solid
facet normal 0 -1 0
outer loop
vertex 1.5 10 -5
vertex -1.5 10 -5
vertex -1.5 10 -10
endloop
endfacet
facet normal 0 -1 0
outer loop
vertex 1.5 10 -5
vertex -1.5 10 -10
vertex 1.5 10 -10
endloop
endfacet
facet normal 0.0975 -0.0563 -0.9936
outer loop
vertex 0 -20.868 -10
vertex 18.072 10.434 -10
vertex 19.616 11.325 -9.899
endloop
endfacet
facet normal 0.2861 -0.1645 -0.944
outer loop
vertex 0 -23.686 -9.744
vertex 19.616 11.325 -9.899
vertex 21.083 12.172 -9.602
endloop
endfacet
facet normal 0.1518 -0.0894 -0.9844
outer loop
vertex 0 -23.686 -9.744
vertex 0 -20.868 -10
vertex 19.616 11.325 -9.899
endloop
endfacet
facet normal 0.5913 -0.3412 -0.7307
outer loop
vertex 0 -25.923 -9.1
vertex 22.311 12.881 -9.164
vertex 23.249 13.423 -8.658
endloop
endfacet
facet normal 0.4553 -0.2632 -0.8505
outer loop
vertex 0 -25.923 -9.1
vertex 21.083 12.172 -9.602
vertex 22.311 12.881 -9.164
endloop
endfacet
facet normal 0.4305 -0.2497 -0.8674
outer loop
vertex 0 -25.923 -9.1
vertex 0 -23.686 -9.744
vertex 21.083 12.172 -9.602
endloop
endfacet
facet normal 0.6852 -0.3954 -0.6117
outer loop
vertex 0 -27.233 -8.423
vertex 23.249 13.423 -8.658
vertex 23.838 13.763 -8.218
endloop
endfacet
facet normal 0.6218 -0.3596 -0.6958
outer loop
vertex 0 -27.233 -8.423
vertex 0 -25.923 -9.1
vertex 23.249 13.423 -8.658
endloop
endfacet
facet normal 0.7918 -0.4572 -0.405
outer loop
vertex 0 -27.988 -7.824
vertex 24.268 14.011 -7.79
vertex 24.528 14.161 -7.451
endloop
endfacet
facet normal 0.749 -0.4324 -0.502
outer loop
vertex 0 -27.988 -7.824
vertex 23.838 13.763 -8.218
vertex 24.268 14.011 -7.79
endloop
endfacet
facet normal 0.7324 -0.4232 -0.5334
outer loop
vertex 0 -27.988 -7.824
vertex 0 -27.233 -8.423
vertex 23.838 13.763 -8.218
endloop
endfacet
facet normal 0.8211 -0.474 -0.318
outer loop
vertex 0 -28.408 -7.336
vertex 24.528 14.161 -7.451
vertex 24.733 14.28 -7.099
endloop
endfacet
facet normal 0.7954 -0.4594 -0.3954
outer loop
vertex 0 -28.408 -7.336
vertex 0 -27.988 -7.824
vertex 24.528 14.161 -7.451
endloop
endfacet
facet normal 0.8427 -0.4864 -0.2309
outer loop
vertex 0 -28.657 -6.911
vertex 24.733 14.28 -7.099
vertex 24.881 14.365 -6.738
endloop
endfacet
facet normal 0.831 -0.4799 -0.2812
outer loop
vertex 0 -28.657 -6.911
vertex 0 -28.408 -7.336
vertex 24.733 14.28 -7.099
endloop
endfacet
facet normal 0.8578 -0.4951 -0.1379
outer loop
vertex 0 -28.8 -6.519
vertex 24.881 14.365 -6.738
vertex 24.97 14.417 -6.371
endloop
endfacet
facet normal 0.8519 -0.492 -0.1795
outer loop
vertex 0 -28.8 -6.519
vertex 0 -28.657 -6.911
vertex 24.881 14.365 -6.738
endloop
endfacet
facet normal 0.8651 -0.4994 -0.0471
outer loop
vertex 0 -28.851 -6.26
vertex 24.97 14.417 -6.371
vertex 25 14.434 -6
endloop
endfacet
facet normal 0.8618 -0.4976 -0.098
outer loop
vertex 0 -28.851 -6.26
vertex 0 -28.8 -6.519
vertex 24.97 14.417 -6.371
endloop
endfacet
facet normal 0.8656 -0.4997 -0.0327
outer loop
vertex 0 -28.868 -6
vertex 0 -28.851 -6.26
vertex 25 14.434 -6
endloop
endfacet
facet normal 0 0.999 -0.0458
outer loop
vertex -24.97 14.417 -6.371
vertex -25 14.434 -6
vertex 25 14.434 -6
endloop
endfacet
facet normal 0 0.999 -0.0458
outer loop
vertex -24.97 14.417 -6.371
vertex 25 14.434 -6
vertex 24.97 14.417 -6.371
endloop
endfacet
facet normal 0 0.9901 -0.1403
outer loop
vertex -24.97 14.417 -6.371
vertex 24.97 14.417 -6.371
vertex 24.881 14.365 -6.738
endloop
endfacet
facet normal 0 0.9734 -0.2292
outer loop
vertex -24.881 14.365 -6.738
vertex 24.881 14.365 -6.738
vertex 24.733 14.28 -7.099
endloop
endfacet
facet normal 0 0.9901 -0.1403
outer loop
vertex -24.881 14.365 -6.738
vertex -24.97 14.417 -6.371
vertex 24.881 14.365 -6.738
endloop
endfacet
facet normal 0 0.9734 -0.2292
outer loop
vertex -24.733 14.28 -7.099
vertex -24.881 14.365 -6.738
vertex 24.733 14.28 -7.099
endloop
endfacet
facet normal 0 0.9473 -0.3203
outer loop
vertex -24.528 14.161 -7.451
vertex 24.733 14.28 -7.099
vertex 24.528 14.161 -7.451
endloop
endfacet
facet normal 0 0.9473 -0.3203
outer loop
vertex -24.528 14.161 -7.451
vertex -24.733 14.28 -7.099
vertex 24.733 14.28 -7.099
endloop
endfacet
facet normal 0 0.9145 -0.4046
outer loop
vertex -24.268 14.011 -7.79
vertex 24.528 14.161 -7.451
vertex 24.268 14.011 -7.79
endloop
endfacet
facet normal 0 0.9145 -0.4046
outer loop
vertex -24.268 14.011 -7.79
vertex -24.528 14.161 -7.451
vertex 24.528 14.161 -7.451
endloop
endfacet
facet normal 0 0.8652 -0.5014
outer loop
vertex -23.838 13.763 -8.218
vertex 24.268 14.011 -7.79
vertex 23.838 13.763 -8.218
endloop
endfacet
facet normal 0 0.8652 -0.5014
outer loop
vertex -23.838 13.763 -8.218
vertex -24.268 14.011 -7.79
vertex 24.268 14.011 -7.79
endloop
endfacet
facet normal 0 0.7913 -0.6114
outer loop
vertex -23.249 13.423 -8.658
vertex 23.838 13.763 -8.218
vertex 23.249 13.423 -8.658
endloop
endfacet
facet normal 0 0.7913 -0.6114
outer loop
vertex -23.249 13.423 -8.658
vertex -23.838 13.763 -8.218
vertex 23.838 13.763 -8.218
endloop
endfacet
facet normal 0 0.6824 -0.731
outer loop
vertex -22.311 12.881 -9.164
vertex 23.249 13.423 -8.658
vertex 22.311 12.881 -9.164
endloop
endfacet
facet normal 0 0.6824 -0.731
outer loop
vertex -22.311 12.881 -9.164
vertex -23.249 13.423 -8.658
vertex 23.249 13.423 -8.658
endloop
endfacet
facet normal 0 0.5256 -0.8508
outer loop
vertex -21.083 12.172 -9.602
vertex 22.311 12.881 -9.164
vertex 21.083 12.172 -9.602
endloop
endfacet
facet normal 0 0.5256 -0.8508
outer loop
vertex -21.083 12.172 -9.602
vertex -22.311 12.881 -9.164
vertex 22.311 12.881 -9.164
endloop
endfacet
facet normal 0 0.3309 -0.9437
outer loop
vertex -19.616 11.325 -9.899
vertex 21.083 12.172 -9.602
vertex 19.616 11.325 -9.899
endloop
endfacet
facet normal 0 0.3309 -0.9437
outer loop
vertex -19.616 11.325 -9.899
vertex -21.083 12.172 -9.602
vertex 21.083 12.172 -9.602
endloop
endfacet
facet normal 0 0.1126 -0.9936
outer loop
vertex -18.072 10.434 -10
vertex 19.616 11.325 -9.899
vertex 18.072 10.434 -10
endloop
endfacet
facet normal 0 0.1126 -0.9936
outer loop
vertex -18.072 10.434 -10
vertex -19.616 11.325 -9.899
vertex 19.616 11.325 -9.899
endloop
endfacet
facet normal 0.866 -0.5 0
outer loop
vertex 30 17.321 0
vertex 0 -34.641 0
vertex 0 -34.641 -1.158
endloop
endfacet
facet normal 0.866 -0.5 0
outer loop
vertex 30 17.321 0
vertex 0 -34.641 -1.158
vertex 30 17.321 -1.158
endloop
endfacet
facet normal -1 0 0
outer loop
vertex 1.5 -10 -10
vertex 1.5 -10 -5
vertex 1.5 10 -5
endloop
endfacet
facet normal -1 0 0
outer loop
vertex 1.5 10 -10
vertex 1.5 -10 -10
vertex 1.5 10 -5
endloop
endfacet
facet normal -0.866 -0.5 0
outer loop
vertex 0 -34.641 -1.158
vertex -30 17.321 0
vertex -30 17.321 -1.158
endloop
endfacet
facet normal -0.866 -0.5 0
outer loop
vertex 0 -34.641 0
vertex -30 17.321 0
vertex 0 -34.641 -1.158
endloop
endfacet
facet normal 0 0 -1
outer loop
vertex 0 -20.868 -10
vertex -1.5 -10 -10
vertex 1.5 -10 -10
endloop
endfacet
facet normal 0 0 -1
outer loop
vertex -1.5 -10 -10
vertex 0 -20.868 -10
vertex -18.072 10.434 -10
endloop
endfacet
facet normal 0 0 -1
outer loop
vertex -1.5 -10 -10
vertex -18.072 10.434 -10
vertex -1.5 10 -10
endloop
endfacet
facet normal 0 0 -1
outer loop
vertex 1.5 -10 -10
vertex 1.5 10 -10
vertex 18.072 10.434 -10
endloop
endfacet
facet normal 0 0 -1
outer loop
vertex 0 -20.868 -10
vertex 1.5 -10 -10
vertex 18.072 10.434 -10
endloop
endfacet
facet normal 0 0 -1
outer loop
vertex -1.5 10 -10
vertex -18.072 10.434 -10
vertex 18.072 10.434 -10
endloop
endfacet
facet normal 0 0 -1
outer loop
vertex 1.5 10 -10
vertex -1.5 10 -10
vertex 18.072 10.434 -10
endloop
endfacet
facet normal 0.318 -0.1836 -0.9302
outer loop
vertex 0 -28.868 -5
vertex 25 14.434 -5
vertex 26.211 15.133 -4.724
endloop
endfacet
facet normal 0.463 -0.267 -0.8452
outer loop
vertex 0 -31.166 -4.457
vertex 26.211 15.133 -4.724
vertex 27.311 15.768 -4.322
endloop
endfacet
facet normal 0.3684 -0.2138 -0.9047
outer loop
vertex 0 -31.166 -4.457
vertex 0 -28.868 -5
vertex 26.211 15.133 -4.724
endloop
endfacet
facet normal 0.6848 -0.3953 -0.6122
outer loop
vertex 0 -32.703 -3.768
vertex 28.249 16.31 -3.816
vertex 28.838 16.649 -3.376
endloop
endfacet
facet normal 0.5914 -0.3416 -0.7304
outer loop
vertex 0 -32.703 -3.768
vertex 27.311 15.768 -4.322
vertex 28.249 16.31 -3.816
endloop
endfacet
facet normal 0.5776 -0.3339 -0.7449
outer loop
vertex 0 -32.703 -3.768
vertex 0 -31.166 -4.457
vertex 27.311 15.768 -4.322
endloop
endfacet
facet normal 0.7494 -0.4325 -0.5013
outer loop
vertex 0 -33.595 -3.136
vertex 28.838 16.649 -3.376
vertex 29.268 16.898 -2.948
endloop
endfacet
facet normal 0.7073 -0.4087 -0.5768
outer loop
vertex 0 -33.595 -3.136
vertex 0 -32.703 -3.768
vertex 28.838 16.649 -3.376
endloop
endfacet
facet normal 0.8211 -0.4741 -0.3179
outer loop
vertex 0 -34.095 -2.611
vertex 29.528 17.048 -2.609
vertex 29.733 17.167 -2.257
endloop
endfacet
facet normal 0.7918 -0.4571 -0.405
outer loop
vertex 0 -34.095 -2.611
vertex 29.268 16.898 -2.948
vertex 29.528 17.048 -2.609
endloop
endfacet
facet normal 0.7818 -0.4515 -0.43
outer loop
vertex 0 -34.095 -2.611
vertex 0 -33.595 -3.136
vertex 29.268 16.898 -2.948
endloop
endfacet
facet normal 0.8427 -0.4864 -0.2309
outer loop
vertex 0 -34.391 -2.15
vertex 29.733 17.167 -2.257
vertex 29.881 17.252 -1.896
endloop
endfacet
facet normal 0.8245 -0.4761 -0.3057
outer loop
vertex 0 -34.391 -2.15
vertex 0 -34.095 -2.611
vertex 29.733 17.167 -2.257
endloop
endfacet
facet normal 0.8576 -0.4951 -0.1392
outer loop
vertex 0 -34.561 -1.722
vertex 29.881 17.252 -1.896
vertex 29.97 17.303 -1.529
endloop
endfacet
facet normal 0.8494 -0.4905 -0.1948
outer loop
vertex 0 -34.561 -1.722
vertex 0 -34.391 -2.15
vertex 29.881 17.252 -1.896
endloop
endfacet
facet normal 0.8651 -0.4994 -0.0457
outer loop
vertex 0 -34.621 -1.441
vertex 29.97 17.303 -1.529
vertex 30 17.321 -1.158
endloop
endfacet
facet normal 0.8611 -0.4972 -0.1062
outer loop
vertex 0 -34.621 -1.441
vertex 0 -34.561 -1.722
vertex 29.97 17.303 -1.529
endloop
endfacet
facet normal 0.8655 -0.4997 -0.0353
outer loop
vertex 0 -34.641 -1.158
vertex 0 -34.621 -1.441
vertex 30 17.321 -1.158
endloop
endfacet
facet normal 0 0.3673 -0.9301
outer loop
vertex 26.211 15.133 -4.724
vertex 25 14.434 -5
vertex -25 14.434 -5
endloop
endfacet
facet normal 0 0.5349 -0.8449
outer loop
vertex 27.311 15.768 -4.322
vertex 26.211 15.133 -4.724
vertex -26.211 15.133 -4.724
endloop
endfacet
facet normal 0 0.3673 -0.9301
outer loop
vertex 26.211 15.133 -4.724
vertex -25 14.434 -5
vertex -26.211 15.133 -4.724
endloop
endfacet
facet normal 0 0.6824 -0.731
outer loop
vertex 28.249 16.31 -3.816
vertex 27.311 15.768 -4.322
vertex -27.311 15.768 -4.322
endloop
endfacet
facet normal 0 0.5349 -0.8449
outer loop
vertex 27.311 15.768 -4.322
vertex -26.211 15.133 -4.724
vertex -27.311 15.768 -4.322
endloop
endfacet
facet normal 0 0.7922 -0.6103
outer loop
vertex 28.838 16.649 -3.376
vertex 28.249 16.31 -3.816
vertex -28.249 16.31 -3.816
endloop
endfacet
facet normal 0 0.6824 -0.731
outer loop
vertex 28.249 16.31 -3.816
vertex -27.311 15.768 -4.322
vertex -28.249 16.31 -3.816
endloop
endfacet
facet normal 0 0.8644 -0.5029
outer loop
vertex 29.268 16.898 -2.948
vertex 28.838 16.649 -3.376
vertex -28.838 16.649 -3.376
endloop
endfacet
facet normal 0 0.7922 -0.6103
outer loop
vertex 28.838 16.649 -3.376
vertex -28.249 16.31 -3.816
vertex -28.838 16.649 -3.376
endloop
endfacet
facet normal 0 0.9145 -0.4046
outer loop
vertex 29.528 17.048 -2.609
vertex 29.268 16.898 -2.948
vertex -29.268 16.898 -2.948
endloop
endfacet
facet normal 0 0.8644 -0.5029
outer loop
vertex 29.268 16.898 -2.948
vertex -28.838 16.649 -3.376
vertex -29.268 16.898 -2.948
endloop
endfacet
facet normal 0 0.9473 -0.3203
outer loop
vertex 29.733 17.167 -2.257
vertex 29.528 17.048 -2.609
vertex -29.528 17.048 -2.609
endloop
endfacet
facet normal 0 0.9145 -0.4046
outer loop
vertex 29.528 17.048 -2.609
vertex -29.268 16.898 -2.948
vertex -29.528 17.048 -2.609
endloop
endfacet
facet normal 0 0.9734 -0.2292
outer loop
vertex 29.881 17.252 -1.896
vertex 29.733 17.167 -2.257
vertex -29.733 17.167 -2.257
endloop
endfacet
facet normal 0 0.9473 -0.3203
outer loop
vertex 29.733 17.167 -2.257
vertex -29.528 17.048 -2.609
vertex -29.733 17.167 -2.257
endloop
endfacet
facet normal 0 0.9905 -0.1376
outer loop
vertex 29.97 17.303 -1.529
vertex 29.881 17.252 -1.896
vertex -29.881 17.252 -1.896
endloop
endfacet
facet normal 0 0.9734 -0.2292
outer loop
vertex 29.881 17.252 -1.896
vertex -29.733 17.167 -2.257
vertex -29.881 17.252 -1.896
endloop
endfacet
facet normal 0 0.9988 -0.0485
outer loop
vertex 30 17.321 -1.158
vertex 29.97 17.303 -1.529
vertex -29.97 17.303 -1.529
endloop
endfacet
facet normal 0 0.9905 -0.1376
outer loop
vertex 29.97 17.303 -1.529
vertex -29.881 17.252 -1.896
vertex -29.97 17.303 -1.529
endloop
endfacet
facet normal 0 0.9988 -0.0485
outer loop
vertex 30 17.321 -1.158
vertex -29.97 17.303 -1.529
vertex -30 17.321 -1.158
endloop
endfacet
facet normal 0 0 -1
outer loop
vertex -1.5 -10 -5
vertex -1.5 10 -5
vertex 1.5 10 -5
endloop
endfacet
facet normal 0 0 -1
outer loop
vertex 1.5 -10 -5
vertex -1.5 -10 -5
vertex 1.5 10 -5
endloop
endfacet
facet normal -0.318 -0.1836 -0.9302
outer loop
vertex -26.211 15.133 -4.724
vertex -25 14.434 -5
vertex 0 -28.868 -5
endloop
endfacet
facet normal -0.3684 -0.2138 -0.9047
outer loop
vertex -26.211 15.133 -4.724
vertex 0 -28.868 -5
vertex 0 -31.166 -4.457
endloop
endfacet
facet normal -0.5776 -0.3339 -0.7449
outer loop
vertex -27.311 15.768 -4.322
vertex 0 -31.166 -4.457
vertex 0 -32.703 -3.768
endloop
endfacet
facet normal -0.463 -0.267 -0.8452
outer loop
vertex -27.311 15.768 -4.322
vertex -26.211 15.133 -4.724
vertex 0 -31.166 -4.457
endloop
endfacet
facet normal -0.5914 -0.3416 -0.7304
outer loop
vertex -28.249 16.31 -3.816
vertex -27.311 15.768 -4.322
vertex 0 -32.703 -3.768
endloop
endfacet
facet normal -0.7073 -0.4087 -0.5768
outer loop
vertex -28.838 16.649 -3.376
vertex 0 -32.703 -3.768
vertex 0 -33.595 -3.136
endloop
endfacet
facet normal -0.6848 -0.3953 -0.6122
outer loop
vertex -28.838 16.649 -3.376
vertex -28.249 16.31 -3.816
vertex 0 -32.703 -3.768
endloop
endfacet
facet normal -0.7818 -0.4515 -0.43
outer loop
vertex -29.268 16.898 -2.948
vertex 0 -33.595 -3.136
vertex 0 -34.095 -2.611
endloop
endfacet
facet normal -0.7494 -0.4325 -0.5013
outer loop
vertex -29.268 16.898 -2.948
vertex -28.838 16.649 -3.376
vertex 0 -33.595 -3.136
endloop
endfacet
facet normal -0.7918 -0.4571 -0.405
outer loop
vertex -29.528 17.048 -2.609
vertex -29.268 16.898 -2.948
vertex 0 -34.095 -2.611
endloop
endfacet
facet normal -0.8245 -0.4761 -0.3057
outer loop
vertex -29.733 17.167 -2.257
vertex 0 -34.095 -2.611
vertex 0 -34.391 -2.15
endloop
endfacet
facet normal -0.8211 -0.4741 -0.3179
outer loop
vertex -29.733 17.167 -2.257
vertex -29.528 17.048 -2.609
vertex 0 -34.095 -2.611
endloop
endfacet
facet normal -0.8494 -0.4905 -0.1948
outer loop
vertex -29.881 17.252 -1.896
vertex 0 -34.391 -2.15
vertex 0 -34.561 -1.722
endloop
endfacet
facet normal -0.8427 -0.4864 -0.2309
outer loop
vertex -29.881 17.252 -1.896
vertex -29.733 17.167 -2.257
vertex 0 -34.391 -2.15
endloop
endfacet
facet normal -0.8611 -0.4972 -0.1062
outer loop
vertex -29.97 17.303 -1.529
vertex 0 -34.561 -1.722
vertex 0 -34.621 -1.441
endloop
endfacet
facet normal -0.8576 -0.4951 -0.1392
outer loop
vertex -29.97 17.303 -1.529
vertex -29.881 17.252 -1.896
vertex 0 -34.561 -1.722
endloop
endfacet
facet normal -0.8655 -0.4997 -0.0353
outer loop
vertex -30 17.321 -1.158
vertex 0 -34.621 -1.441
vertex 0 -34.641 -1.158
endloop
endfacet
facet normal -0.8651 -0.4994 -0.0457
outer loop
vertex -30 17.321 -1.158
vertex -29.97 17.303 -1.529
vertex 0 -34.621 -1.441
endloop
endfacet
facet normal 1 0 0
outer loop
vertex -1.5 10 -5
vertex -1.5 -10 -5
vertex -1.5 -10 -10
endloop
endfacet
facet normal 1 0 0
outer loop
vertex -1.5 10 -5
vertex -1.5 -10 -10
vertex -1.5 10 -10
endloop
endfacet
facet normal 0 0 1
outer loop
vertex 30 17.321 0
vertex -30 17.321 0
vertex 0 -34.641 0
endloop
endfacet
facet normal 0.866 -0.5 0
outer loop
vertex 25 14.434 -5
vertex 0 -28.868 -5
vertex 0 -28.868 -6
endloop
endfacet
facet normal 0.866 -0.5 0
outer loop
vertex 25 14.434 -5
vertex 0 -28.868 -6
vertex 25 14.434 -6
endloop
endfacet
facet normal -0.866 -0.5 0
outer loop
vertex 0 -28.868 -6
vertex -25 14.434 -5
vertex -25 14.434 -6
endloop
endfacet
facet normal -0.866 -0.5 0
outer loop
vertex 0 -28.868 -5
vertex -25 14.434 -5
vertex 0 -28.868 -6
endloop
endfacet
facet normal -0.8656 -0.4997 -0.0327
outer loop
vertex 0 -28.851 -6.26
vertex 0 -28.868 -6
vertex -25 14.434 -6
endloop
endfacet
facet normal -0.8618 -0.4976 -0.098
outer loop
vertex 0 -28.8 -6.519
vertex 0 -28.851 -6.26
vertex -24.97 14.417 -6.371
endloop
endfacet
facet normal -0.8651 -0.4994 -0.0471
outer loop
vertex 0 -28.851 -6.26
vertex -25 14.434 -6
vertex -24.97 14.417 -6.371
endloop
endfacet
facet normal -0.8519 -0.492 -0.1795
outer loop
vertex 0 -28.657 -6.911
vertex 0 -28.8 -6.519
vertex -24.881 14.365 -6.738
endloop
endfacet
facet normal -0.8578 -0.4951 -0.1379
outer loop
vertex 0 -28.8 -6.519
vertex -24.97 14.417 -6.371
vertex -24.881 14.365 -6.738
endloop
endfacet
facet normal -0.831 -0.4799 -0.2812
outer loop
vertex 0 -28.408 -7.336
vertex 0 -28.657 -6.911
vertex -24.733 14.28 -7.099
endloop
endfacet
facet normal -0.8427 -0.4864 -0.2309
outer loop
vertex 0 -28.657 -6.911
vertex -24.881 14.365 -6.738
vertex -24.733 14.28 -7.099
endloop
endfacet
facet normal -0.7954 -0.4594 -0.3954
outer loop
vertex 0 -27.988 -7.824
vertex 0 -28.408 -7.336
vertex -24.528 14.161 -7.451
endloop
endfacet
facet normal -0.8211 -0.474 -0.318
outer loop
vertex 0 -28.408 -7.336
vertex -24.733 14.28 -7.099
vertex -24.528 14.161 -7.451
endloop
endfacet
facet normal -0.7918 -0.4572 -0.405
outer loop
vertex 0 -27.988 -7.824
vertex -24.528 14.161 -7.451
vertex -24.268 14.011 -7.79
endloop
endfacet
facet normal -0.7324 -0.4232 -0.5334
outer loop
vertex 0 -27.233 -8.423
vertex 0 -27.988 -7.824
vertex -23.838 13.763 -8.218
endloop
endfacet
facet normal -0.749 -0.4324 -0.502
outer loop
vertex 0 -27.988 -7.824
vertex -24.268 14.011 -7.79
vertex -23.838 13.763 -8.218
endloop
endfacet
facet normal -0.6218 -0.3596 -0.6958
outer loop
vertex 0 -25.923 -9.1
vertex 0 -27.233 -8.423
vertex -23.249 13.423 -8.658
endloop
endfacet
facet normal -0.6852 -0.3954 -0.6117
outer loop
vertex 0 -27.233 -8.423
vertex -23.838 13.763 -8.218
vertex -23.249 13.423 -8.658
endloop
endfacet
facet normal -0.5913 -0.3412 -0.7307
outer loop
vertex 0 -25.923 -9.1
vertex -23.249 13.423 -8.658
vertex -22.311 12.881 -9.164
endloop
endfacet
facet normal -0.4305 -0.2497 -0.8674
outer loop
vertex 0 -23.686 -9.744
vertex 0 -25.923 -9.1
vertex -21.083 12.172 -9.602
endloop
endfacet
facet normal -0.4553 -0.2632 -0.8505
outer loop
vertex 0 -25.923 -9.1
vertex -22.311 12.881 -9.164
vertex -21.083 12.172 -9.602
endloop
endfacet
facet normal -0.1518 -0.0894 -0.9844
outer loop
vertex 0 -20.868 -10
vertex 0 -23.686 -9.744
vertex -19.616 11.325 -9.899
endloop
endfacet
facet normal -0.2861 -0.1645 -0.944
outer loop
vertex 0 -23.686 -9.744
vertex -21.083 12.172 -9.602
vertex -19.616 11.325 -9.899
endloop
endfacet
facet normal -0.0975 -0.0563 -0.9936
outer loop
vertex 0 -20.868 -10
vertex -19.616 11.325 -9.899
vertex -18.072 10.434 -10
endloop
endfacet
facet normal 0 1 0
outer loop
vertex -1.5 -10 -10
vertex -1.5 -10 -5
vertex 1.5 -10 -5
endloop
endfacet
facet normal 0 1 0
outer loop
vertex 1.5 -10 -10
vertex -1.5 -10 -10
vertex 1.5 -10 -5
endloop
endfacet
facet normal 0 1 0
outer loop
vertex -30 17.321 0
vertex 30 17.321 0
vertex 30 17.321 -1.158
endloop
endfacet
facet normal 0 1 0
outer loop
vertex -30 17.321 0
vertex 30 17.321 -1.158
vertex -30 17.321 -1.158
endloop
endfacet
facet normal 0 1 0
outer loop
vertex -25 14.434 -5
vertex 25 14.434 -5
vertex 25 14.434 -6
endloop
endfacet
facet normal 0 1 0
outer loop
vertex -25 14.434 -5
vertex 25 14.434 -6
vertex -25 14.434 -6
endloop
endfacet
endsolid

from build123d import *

# Parameters (mm, degrees)
F0_W         = 3
F0_H         = 20
F1_DEPTH     = 10
F2_DEPTH     = 5
F3_T1_DEPTH  = 70
F3_T3_DEPTH  = 79.20981353
F3_T5_DEPTH  = 70
F3_T7_DEPTH  = 70
F3_T9_DEPTH  = 79.20981353
F3_T11_DEPTH = 79.20981353


# Not quite as in the source:
# - a fillet or chamfer that OpenCascade refuses, or shapes differently, is made with other operations: its cross-section is extruded or revolved along the edge and cut away or added


with BuildPart() as f1:
    # F0 (on Top) → F1 (new body)
    with BuildSketch(Plane.XY):
        Polygon((25, 14.4337567297), (-25, 14.4337567297), (0, -28.8675134595), align=None)
        Rectangle(F0_W, F0_H, mode=Mode.SUBTRACT)
    extrude(amount=-F1_DEPTH)

    # F0 (on Top) → F2 (join)
    with BuildSketch(Plane.XY):
        Polygon((30, 17.3205080757), (-30, 17.3205080757), (0, -34.6410161514), align=None)
        Polygon((0, -28.8675134595), (-25, 14.4337567297), (25, 14.4337567297), align=None, mode=Mode.SUBTRACT)
        Rectangle(F0_W, F0_H)
    extrude(amount=-F2_DEPTH)

    # F3: fillet of radius 4 on 6 edges, made by hand

    # F3_s2 → F3_t1 (cut)
    with BuildSketch(Plane.YZ.offset(-35)):
        with BuildLine():
            ThreePointArc((14.4337567297, -6), (13.2621838545, -8.8284271247), (10.4337567297, -10))
            Line((10.4337567297, -10), (14.4337567297, -10))
            Line((14.4337567297, -10), (14.4337567297, -6))
        make_face()
    extrude(amount=F3_T1_DEPTH, mode=Mode.SUBTRACT)

    # F3_s4 → F3_t3 (cut)
    with BuildSketch(Plane.YZ.offset(-39.604906765)):
        with BuildLine():
            ThreePointArc((14.4337567297, -5), (16.5183975841, -3.5608487081), (17.3205080757, -1.158037294))
            Line((17.3205080757, -1.158037294), (17.3205080757, -5))
            Line((17.3205080757, -5), (14.4337567297, -5))
        make_face()
    extrude(amount=F3_T3_DEPTH, mode=Mode.SUBTRACT)

    # F3_s6 → F3_t5 (cut)
    with BuildSketch(Plane(origin=(-17.5, -30.3108891325, 0), x_dir=(0, 0, 1), z_dir=(0.5, 0.8660254038, 0))):
        with BuildLine():
            ThreePointArc((-10, 10.4337567297), (-8.8284271247, 13.2621838545), (-6, 14.4337567297))
            Line((-6, 14.4337567297), (-10, 14.4337567297))
            Line((-10, 14.4337567297), (-10, 10.4337567297))
        make_face()
    extrude(amount=F3_T5_DEPTH, mode=Mode.SUBTRACT)

    # F3_s8 → F3_t7 (cut)
    with BuildSketch(Plane(origin=(-17.5, 30.3108891325, 0), x_dir=(0, 0, 1), z_dir=(0.5, -0.8660254038, 0))):
        with BuildLine():
            ThreePointArc((-6, 14.4337567297), (-8.8284271247, 13.2621838545), (-10, 10.4337567297))
            Line((-10, 10.4337567297), (-10, 14.4337567297))
            Line((-10, 14.4337567297), (-6, 14.4337567297))
        make_face()
    extrude(amount=F3_T7_DEPTH, mode=Mode.SUBTRACT)

    # F3_s10 → F3_t9 (cut)
    with BuildSketch(Plane(origin=(-19.8024533825, -34.298855373, 0), x_dir=(0, 0, 1), z_dir=(0.5, 0.8660254038, 0))):
        with BuildLine():
            ThreePointArc((-5, 14.4337567297), (-3.5608487081, 16.5183975841), (-1.158037294, 17.3205080757))
            Line((-1.158037294, 17.3205080757), (-5, 17.3205080757))
            Line((-5, 17.3205080757), (-5, 14.4337567297))
        make_face()
    extrude(amount=F3_T9_DEPTH, mode=Mode.SUBTRACT)

    # F3_s12 → F3_t11 (cut)
    with BuildSketch(Plane(origin=(-19.8024533825, 34.298855373, 0), x_dir=(0, 0, 1), z_dir=(0.5, -0.8660254038, 0))):
        with BuildLine():
            ThreePointArc((-5, 14.4337567297), (-3.5608487081, 16.5183975841), (-1.158037294, 17.3205080757))
            Line((-1.158037294, 17.3205080757), (-5, 17.3205080757))
            Line((-5, 17.3205080757), (-5, 14.4337567297))
        make_face()
    extrude(amount=F3_T11_DEPTH, mode=Mode.SUBTRACT)


solid = f1.part
